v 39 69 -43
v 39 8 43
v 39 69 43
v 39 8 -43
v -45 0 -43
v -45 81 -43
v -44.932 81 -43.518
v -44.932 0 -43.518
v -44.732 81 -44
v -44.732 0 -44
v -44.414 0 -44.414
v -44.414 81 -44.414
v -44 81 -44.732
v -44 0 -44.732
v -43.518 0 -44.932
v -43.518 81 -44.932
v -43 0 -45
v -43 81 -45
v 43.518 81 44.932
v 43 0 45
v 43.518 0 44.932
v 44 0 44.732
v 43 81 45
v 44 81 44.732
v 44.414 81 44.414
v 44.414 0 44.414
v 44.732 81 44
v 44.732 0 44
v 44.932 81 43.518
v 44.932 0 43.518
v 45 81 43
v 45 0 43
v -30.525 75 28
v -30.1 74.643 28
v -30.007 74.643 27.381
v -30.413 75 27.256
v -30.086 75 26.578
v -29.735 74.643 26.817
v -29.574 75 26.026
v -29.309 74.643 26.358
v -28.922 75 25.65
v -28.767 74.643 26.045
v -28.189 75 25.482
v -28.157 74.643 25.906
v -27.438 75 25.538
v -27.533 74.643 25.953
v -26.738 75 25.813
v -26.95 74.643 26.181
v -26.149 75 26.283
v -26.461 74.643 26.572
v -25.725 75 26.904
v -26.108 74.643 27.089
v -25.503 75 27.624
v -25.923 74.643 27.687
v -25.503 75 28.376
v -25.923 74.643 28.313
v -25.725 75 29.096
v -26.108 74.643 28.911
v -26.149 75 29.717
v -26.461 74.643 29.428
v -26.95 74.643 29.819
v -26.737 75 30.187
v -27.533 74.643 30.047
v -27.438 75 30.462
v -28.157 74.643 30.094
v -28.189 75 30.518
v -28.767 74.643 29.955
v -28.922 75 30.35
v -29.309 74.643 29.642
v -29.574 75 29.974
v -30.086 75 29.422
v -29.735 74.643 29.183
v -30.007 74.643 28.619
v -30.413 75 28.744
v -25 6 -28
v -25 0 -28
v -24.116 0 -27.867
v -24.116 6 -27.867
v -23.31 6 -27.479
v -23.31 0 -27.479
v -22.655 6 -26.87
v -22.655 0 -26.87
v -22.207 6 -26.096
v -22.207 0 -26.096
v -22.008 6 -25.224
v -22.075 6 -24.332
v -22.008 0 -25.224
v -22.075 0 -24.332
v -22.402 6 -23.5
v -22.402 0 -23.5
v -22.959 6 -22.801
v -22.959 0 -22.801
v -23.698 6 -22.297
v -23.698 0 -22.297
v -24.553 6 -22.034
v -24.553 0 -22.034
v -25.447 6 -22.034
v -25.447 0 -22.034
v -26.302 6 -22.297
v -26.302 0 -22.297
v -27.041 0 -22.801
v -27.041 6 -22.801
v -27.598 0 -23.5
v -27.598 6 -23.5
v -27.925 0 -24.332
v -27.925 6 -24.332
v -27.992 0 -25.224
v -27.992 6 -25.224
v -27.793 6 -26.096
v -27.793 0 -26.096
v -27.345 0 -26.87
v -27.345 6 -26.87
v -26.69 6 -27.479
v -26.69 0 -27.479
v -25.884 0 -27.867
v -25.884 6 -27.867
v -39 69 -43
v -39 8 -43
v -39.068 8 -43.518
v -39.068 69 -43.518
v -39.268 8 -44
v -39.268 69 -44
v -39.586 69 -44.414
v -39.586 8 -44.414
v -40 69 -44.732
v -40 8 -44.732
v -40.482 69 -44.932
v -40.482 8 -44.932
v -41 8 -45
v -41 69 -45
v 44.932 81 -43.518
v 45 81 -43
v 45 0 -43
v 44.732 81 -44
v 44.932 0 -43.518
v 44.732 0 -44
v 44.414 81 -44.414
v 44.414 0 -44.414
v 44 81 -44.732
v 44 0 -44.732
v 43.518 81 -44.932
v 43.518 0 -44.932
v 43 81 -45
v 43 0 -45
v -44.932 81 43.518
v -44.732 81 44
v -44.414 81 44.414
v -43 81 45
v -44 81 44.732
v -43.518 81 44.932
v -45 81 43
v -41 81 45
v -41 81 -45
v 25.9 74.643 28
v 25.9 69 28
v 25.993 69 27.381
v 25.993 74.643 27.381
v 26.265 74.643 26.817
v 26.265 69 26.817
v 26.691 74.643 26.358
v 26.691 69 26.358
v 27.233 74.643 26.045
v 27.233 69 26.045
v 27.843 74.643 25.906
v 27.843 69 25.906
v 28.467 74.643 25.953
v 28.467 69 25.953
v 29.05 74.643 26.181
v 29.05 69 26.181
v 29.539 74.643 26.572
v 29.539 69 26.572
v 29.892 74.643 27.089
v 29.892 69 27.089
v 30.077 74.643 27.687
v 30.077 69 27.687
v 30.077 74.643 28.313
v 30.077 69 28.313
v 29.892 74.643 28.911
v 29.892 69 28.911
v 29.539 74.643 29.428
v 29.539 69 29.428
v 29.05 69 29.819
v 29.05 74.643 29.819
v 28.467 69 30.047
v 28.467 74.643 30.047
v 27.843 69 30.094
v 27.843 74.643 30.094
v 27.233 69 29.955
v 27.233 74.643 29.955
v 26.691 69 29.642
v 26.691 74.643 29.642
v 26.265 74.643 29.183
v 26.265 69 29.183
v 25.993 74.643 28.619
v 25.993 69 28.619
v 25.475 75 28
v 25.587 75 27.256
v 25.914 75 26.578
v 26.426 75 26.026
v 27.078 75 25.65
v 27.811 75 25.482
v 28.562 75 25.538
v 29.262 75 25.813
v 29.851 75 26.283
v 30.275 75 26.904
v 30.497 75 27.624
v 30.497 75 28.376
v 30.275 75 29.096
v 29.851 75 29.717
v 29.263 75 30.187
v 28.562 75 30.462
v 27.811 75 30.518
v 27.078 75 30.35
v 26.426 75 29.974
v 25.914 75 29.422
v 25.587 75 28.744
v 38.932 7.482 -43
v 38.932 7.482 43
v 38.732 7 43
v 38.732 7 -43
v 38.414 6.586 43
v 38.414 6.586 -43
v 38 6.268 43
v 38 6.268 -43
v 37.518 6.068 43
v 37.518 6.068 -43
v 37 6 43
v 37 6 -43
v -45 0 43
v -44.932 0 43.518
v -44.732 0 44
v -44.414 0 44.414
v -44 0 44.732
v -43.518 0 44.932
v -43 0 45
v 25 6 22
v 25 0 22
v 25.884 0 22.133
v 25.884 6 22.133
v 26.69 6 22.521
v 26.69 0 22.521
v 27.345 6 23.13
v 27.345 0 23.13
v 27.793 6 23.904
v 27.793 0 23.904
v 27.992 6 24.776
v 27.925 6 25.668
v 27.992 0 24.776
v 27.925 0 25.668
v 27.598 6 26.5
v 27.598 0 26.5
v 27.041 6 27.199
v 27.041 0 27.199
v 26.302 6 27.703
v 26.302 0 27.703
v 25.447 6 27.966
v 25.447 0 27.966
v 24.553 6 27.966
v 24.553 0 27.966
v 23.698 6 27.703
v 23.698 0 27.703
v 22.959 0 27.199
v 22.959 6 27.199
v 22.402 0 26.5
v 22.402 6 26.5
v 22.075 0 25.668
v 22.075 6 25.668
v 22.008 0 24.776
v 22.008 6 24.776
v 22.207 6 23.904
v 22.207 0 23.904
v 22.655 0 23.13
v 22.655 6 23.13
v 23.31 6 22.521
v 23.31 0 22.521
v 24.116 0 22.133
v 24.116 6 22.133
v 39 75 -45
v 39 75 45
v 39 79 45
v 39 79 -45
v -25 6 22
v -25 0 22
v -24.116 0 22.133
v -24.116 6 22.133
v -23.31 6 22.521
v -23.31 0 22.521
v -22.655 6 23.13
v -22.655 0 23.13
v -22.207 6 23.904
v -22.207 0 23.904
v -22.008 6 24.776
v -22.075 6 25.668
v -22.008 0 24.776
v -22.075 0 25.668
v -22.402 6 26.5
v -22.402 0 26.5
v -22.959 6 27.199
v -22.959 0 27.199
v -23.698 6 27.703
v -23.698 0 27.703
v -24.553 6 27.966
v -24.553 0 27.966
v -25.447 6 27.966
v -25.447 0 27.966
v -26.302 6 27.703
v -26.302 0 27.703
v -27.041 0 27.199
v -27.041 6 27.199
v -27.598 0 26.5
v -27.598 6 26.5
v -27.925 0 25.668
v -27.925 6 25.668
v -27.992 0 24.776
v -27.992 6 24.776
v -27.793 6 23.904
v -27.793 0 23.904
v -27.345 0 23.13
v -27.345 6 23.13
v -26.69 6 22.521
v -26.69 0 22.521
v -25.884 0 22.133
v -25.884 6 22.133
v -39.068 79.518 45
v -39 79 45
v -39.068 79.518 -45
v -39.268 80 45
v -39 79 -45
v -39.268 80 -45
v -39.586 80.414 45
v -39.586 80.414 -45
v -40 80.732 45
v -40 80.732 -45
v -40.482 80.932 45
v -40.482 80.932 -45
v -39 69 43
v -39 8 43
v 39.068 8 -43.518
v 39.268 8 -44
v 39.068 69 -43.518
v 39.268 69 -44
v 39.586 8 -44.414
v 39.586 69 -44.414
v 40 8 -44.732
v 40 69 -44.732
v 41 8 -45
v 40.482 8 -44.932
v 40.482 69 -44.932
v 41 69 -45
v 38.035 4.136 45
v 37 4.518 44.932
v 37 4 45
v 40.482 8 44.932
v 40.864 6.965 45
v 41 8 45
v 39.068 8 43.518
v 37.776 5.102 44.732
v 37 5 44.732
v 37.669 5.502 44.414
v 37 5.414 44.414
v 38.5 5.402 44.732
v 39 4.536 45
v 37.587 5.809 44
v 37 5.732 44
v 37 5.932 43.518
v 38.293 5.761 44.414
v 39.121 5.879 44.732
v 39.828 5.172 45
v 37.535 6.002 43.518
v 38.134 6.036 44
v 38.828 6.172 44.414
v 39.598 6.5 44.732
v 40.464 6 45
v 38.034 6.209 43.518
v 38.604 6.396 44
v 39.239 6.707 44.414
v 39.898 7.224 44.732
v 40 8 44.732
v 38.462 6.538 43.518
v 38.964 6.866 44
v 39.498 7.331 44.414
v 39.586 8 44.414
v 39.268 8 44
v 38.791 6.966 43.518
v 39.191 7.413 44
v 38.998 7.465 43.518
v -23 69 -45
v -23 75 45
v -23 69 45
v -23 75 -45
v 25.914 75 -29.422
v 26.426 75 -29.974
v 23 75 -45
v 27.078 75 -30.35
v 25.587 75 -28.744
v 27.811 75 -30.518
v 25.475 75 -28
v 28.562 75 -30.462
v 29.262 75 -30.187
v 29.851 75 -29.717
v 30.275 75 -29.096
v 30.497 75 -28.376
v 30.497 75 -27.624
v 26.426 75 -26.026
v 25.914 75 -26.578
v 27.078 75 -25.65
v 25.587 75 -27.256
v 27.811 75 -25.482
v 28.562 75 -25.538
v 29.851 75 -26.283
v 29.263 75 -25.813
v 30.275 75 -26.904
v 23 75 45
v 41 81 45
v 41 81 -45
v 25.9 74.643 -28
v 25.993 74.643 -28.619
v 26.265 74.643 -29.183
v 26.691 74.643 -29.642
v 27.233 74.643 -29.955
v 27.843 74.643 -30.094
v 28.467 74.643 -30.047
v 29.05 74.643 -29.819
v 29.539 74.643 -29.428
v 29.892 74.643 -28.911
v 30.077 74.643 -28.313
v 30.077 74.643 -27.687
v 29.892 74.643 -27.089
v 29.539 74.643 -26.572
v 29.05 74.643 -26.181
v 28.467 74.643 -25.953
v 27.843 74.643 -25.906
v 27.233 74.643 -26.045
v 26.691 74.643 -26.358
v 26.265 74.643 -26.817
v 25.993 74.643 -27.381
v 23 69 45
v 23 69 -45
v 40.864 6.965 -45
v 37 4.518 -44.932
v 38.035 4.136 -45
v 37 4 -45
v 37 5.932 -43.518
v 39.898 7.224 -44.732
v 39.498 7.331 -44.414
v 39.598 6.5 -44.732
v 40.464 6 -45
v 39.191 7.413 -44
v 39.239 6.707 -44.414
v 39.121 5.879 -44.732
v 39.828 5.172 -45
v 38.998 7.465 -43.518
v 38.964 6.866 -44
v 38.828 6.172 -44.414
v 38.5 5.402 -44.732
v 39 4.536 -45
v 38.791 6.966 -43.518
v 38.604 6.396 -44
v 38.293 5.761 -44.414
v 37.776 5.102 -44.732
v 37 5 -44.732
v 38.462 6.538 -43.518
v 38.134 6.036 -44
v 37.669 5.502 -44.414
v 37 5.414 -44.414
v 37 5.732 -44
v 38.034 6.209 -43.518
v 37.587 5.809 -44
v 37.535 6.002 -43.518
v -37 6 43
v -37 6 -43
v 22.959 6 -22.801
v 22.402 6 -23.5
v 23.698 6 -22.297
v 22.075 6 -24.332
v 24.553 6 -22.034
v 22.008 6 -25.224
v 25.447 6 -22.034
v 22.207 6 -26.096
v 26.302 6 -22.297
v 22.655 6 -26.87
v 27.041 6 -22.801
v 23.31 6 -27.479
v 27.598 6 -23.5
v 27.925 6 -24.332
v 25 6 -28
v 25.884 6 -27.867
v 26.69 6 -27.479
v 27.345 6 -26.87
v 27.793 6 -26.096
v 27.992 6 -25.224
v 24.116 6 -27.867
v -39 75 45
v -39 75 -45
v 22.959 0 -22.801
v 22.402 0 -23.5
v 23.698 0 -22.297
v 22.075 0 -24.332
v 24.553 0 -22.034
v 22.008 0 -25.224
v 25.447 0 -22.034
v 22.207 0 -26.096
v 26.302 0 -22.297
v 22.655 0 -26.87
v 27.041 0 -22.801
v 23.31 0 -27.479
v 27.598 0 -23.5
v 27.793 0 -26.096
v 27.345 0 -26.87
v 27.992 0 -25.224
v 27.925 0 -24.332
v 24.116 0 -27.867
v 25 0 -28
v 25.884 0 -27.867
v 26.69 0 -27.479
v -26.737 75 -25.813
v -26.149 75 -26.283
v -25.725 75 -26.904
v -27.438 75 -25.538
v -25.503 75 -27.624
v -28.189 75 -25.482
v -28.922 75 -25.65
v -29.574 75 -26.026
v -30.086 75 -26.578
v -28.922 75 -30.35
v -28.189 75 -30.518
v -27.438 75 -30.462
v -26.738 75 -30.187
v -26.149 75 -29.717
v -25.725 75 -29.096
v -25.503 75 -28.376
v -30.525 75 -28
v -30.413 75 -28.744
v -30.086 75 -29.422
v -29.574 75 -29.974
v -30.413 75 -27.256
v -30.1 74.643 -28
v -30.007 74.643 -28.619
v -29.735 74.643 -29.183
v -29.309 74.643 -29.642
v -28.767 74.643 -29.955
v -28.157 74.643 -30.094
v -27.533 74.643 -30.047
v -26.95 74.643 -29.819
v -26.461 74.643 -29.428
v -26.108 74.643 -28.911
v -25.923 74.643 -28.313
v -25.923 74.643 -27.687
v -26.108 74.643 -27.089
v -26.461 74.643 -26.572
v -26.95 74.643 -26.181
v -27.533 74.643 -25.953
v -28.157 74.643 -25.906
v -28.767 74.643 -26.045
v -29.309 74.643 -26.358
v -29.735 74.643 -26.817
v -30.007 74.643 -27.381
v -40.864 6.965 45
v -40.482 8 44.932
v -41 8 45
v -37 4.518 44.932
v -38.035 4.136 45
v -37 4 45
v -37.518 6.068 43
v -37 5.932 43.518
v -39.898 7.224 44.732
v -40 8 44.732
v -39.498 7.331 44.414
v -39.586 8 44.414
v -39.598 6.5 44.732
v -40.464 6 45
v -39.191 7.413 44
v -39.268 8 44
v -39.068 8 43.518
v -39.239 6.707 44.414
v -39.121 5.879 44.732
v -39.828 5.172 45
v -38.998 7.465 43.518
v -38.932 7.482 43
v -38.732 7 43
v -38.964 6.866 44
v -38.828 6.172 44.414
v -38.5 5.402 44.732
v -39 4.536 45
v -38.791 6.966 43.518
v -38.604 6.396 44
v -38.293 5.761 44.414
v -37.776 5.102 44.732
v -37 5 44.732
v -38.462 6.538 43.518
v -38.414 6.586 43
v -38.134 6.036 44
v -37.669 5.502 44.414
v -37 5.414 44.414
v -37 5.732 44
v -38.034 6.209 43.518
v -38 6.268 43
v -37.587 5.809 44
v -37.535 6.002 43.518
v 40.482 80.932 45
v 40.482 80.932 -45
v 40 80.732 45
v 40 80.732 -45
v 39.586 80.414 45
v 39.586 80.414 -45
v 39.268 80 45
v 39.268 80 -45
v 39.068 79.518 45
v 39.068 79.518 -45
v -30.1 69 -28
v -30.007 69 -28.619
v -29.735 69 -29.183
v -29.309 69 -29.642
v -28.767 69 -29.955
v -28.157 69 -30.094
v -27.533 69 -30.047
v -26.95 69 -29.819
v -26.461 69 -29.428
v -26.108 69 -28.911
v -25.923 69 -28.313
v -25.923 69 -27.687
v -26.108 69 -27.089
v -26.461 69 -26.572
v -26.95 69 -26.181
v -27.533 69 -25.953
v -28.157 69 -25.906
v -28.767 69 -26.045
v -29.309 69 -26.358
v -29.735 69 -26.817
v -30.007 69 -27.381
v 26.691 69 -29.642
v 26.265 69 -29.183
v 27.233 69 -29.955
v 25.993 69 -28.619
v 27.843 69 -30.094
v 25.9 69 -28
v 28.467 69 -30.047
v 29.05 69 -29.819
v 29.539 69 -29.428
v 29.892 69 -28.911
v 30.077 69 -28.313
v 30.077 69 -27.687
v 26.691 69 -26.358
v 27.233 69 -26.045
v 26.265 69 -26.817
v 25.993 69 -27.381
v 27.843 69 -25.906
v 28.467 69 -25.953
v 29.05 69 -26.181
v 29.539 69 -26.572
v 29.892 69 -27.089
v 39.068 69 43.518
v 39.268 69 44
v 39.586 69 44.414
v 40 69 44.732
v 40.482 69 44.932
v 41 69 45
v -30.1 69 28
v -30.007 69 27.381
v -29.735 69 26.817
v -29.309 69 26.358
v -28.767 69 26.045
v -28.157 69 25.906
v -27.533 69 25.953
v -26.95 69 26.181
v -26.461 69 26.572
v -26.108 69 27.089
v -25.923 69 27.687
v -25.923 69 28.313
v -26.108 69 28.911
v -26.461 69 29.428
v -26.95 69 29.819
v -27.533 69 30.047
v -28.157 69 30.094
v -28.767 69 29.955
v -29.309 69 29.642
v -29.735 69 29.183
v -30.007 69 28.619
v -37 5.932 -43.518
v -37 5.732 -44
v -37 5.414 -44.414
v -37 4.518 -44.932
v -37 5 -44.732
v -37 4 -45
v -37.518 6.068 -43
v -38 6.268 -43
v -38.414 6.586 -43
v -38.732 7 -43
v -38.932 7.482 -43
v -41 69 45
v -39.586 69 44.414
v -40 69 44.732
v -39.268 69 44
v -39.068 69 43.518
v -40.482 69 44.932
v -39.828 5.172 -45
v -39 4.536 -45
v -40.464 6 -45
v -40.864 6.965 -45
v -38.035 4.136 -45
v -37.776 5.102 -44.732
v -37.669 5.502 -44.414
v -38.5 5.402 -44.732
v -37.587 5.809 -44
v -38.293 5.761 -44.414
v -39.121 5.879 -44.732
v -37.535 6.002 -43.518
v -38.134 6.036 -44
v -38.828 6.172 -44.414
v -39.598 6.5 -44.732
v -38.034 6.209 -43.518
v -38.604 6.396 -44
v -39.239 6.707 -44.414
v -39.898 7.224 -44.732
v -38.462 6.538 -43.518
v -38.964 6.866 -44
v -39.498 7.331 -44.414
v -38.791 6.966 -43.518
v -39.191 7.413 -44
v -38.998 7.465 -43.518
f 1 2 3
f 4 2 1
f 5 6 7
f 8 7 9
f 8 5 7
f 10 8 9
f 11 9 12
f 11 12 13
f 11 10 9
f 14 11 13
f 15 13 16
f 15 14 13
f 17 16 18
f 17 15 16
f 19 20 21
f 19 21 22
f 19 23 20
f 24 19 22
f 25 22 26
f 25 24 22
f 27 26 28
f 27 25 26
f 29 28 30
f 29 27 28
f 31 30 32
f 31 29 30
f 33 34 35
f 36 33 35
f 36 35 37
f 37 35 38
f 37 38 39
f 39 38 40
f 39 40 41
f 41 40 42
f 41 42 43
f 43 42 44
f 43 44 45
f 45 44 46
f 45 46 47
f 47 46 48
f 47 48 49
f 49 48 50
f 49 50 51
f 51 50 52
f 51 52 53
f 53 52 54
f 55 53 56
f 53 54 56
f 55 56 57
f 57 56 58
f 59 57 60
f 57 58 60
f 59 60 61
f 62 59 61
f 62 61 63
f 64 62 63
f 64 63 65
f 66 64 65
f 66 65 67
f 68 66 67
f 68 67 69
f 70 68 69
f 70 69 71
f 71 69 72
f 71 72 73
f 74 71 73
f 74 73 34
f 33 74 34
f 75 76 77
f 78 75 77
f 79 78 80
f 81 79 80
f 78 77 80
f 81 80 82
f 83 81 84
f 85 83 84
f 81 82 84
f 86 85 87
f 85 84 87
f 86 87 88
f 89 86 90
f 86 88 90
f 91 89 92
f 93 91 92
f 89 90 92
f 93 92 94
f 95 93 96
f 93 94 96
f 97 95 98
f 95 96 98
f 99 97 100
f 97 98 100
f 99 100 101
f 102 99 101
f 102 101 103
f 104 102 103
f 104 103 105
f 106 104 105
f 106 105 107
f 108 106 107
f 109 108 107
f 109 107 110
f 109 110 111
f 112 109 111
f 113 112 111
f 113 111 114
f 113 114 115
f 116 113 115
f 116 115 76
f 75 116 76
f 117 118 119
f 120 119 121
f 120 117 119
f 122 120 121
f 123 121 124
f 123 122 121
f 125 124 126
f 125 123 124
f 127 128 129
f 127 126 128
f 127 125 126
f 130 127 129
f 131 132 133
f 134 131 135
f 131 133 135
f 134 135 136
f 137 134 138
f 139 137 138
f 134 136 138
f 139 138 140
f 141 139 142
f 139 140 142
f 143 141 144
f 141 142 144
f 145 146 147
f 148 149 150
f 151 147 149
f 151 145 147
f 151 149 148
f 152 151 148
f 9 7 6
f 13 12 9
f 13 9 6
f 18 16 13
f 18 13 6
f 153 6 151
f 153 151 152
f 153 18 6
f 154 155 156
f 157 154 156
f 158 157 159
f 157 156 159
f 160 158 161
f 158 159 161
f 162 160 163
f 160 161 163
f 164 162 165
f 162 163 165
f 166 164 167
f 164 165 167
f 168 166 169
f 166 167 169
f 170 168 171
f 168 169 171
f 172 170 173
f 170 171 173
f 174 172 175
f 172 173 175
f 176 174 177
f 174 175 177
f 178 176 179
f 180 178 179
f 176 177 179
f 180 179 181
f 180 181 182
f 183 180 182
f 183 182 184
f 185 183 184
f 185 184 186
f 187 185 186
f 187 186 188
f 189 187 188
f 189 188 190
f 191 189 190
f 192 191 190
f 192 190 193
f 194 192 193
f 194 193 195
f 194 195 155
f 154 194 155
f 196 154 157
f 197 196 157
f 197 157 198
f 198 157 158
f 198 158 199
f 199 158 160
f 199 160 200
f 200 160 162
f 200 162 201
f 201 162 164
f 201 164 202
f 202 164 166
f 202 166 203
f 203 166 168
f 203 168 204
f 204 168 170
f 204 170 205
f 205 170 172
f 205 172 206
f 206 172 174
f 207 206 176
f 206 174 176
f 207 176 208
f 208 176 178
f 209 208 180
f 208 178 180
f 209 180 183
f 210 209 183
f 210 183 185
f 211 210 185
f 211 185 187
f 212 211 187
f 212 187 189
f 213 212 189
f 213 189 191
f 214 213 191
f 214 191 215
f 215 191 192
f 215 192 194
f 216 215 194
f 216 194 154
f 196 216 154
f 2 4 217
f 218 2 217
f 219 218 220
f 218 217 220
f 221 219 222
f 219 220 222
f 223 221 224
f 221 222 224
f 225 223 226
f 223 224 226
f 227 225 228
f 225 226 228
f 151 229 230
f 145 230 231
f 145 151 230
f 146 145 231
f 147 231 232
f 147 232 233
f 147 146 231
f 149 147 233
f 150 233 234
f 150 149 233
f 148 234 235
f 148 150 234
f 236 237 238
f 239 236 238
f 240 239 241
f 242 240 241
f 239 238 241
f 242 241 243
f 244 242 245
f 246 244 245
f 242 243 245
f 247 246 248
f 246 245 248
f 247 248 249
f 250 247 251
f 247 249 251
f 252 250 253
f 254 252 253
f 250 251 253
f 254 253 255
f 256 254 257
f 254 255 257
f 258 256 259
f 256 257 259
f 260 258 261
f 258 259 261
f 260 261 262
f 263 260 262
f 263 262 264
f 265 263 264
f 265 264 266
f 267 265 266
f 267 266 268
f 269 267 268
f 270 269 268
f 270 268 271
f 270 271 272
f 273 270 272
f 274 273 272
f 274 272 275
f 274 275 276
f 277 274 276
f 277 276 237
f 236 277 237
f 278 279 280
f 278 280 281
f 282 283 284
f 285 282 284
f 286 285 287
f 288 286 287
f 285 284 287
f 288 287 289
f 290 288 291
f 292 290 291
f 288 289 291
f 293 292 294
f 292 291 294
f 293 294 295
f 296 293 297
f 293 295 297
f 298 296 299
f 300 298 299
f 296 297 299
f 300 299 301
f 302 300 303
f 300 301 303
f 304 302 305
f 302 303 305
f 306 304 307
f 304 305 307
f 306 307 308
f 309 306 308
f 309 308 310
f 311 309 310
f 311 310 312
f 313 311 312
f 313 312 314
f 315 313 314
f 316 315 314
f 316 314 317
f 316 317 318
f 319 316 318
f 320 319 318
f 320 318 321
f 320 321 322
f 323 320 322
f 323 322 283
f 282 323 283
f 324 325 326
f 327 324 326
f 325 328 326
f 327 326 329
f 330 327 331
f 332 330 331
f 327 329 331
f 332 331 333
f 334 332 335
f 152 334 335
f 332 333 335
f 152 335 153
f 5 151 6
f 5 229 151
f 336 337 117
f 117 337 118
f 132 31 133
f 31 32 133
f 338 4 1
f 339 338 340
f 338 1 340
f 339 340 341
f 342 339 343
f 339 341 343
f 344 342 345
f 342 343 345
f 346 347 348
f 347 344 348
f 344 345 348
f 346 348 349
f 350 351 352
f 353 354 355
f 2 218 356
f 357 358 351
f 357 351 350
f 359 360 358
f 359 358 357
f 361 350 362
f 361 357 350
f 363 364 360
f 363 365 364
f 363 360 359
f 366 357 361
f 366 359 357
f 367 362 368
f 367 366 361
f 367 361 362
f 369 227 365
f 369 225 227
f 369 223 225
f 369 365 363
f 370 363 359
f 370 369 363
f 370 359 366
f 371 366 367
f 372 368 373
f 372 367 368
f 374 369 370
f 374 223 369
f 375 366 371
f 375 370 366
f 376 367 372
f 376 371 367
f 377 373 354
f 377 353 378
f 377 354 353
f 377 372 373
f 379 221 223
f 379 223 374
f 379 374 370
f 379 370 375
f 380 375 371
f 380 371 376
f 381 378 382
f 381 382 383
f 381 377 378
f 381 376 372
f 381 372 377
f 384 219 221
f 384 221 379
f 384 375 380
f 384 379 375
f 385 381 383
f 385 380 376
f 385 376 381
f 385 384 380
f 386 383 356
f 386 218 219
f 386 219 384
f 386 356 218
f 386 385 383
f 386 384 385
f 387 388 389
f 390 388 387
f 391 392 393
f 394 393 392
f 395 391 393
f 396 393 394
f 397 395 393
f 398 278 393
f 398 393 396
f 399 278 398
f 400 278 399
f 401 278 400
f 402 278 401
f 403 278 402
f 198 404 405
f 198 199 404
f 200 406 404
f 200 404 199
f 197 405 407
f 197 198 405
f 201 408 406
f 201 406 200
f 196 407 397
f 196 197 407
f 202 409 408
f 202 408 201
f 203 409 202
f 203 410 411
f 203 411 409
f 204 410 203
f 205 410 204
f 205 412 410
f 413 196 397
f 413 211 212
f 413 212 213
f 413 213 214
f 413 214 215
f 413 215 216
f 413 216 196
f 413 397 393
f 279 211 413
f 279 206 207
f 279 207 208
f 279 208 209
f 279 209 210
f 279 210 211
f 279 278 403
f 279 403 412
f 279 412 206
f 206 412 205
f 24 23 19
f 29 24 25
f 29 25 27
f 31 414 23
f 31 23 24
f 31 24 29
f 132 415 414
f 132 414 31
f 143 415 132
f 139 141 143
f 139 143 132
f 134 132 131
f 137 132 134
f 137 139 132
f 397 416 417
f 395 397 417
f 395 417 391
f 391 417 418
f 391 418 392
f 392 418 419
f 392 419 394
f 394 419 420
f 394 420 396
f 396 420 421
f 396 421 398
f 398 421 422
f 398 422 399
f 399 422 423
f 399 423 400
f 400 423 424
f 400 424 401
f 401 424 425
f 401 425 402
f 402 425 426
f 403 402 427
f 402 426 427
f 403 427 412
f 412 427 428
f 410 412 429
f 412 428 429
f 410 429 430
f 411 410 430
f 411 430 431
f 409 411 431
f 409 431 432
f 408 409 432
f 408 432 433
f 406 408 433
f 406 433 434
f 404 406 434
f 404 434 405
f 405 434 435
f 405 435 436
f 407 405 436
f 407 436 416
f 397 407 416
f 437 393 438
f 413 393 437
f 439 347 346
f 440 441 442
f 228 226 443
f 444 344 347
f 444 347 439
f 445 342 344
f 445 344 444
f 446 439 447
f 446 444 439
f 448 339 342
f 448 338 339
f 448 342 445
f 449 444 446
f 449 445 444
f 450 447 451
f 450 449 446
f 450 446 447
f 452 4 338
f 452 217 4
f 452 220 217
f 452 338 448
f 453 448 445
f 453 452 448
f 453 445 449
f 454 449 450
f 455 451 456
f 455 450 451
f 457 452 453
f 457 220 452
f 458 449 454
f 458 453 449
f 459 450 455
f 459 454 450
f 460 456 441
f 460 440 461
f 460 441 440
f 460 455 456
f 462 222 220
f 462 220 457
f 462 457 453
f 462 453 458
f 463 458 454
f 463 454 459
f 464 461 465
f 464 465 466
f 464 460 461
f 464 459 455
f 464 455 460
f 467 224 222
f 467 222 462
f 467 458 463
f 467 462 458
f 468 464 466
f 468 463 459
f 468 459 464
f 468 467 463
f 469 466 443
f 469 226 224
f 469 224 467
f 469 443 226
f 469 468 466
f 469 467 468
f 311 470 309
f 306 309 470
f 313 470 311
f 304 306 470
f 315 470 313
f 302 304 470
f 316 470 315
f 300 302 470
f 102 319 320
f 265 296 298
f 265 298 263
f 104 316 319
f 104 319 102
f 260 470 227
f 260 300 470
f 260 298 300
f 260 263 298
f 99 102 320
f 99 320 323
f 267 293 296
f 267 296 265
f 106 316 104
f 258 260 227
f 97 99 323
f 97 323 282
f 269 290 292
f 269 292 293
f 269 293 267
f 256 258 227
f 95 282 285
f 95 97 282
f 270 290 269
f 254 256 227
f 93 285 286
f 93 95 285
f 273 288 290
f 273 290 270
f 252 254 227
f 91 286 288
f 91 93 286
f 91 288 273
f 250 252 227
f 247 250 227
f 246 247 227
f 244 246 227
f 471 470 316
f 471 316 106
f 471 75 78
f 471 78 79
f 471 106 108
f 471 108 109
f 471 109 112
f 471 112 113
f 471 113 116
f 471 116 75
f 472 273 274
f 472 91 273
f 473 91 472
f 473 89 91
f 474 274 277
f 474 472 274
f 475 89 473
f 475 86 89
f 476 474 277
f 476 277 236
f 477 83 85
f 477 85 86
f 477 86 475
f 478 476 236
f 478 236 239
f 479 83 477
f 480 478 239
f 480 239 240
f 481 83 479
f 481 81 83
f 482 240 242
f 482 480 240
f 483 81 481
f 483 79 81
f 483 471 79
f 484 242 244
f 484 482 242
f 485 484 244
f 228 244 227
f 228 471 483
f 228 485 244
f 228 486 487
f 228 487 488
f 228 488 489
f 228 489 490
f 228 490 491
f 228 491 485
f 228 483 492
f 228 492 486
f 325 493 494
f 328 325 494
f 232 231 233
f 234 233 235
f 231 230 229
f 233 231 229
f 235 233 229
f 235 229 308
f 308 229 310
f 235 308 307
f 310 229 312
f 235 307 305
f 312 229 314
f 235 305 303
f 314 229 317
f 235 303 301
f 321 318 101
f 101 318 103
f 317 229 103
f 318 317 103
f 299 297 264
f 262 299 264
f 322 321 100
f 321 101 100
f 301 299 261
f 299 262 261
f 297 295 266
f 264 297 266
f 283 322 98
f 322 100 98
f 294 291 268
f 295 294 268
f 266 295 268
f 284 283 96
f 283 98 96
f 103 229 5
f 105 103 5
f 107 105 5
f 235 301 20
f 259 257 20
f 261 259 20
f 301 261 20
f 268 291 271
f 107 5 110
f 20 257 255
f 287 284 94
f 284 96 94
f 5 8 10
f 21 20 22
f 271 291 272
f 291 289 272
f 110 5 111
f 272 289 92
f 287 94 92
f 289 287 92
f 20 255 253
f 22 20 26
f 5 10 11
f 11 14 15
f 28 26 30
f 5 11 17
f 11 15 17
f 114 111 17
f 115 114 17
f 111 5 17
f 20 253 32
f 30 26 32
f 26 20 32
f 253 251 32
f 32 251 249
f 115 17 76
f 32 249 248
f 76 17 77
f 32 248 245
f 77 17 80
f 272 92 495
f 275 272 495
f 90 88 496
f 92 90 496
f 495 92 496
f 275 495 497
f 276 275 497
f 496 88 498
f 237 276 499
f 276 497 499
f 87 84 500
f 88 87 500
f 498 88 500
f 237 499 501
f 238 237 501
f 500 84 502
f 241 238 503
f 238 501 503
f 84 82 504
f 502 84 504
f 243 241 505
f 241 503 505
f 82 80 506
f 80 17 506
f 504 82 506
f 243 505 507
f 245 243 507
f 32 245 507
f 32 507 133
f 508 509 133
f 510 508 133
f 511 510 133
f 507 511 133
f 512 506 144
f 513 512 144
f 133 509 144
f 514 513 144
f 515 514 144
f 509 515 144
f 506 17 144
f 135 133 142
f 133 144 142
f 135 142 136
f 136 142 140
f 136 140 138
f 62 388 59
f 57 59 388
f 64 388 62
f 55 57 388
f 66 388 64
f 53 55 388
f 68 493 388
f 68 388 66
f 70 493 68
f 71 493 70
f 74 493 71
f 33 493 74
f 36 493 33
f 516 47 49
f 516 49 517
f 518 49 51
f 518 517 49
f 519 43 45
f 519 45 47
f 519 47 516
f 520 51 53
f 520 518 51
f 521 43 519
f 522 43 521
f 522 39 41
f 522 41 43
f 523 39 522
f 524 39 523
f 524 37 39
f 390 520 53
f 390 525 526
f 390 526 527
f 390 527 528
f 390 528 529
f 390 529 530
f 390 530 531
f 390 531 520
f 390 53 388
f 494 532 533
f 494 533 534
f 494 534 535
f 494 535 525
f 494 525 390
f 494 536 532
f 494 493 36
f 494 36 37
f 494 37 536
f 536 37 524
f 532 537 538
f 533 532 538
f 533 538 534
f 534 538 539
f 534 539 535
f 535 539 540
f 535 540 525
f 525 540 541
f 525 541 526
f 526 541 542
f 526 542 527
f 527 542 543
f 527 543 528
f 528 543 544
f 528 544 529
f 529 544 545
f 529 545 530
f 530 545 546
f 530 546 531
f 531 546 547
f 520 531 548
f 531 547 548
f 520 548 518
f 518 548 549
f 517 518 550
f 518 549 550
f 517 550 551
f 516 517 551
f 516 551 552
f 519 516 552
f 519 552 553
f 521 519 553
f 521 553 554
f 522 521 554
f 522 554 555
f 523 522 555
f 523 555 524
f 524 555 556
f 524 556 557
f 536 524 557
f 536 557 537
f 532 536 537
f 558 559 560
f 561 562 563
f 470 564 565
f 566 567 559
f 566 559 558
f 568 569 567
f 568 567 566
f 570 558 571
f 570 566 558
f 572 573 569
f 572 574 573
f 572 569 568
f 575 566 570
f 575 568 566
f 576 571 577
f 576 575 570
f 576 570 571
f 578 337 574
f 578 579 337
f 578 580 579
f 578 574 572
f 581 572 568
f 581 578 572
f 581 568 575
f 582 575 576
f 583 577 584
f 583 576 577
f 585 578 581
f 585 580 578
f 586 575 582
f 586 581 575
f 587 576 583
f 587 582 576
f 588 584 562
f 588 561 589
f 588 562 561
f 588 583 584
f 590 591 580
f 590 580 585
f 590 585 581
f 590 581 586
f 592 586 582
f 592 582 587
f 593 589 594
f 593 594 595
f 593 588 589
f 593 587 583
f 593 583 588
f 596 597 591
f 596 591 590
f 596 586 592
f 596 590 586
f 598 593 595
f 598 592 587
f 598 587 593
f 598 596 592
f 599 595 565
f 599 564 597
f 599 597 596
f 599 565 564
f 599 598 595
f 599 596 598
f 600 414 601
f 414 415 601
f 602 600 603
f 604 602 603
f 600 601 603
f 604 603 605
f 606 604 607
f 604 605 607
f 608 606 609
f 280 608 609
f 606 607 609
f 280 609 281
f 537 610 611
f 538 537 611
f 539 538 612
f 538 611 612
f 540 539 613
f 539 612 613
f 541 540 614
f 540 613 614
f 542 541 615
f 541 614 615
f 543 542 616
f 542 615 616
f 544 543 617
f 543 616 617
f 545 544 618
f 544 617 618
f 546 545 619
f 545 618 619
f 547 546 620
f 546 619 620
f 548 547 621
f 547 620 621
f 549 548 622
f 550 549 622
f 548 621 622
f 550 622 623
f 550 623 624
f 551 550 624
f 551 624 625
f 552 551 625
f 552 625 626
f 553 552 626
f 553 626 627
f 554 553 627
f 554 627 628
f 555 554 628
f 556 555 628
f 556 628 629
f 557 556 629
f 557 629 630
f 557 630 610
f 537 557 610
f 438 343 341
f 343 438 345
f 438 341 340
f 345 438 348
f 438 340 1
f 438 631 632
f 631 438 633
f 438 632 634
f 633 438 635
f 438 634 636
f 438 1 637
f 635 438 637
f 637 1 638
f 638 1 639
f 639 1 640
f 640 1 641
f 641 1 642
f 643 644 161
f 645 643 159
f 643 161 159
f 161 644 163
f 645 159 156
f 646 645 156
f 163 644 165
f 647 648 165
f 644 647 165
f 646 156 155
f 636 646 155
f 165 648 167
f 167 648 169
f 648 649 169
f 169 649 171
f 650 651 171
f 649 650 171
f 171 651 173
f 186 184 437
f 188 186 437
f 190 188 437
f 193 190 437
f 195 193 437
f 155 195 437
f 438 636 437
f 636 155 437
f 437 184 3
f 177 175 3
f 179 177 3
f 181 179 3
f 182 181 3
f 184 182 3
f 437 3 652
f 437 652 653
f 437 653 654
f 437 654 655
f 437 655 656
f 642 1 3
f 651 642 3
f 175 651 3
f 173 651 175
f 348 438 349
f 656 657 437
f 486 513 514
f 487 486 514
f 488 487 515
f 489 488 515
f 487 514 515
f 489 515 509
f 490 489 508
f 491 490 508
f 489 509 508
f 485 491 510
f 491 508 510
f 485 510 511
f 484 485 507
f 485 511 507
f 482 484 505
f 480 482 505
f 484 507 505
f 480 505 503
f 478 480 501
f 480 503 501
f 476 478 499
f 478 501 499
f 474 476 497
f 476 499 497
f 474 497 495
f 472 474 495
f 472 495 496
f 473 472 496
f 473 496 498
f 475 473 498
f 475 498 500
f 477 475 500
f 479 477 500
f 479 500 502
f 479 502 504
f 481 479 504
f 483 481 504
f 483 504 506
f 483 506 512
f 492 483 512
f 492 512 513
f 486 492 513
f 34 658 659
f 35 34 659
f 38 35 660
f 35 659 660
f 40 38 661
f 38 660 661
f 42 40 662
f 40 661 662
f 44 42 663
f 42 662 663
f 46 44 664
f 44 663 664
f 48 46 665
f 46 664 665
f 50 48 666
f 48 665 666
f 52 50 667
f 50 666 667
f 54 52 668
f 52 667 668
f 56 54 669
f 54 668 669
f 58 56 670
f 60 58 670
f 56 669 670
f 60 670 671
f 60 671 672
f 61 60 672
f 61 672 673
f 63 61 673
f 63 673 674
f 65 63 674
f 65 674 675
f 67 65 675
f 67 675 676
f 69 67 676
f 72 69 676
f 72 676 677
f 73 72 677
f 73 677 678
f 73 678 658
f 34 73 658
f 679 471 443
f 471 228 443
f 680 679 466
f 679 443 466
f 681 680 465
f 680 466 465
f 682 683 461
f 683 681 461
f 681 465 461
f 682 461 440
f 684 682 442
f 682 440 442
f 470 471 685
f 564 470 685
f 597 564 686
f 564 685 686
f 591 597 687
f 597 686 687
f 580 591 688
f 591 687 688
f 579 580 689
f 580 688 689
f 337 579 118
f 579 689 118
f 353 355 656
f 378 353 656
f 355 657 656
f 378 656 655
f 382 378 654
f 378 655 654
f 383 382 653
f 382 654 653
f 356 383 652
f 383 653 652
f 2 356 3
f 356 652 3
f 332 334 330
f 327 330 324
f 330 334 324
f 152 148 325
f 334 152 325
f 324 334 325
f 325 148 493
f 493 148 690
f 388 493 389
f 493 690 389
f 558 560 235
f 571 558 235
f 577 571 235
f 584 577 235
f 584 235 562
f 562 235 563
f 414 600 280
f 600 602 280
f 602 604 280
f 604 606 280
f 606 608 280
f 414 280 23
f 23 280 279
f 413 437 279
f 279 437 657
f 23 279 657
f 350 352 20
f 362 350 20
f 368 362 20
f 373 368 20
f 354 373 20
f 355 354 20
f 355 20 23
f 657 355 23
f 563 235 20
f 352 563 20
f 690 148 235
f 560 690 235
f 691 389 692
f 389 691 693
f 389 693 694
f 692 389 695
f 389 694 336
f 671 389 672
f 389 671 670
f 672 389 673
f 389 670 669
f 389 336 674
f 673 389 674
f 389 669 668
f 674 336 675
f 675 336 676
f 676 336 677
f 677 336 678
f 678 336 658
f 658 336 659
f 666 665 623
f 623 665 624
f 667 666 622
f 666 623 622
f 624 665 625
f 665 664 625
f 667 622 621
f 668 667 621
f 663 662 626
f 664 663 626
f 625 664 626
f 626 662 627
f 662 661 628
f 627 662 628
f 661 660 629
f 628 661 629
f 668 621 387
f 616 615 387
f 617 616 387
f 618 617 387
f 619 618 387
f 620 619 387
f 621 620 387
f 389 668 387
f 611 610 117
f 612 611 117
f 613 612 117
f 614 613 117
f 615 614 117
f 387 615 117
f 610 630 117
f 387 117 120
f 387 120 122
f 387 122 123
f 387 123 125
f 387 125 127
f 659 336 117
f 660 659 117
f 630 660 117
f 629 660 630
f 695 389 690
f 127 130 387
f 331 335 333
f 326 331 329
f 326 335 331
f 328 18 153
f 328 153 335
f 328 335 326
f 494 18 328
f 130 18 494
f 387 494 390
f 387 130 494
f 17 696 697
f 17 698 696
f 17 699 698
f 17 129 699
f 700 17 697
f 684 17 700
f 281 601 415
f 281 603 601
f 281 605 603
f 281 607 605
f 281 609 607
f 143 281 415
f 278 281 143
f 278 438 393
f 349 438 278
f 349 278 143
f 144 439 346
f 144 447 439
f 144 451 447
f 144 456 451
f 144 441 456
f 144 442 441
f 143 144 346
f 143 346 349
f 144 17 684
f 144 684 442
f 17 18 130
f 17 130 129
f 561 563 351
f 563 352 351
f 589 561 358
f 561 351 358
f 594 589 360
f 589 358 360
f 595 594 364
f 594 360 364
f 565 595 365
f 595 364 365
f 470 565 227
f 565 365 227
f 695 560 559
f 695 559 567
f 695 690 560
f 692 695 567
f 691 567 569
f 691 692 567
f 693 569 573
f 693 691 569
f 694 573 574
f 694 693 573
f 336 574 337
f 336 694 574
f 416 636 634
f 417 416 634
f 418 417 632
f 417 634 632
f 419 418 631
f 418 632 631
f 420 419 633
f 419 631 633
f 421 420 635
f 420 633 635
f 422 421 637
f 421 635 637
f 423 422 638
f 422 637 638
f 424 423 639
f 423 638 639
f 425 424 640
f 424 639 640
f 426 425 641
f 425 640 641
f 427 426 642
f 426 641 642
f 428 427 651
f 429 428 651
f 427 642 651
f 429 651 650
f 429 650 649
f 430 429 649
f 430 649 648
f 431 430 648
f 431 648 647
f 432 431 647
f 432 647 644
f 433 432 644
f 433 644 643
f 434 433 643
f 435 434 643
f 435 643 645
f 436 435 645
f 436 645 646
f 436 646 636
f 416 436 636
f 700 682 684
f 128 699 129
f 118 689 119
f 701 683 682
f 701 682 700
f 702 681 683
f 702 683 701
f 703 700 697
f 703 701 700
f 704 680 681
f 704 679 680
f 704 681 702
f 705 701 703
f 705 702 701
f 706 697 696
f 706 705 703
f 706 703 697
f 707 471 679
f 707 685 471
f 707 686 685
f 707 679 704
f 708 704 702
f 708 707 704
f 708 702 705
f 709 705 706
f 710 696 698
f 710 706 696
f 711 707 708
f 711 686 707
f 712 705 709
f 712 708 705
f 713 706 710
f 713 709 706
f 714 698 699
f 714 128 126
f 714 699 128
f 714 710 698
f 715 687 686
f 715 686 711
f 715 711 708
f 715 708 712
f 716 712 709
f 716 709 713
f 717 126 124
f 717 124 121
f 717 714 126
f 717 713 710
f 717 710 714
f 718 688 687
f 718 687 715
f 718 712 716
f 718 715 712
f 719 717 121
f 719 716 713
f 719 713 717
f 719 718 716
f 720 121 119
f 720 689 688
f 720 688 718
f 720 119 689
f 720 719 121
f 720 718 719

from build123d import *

# Parameters (mm, degrees)
SKETCH2_W                       = 90
SKETCH2_H                       = 90
BOSS_EXTRUDE1_DEPTH             = 6
SKETCH3_W                       = 6
SKETCH3_H                       = 90
BOSS_EXTRUDE2_DEPTH             = 75
SKETCH5_W                       = 90
SKETCH5_H                       = 6
BOSS_EXTRUDE3_DEPTH             = 16
SKETCH6_W                       = 90
SKETCH6_H                       = 6
BOSS_EXTRUDE4_DEPTH             = 16
CUT_EXTRUDE1_REACH              = 105.01
SKETCH7_R                       = 3
M5X0_8_TAPPED_HOLE2_D           = 4.2
M5X0_8_TAPPED_HOLE2_DEPTH       = 6
M5X0_8_TAPPED_HOLE2_CSINK_D     = 5.05
M5X0_8_TAPPED_HOLE2_CSINK_ANGLE = 100
FILLET2_R                       = 2


with BuildPart() as part:
    # Sketch2 → Boss-Extrude1 (new body)
    with BuildSketch(Plane(origin=(0, 0, 0), x_dir=(1, 0, 0), z_dir=(0, 1, 0))):
        Rectangle(SKETCH2_W, SKETCH2_H)
    extrude(amount=BOSS_EXTRUDE1_DEPTH)

    # Sketch3 → Boss-Extrude2 (add)
    with BuildSketch(Plane(origin=(0, 6, 0), x_dir=(1, 0, 0), z_dir=(0, 1, 0))):
        with Locations((-42, 0)):
            Rectangle(SKETCH3_W, SKETCH3_H)
        with Locations((42, 0)):
            Rectangle(SKETCH3_W, SKETCH3_H)
    extrude(amount=BOSS_EXTRUDE2_DEPTH)

    # Sketch5 → Boss-Extrude3 (add)
    with BuildSketch(Plane(origin=(-39, 0, 0), x_dir=(0, 0, -1), z_dir=(1, 0, 0))):
        with Locations((0, 72)):
            Rectangle(SKETCH5_W, SKETCH5_H)
    extrude(amount=BOSS_EXTRUDE3_DEPTH)

    # Sketch6 → Boss-Extrude4 (add)
    with BuildSketch(Plane.ZY.offset(-39)):
        with Locations((0, 72)):
            Rectangle(SKETCH6_W, SKETCH6_H)
    extrude(amount=BOSS_EXTRUDE4_DEPTH)

    # Sketch7 → Cut-Extrude1 (cut, up to next)
    with BuildSketch(Plane.XZ, mode=Mode.PRIVATE) as cut_extrude1_sk1:
        with Locations(Location((-25, 25, 0), (0, 0, 270))):
            Circle(SKETCH7_R)
    cut_extrude1_tool1 = extrude(cut_extrude1_sk1.sketch, amount=-CUT_EXTRUDE1_REACH, mode=Mode.PRIVATE) & part.part
    # Sketch7 → Cut-Extrude1 (cut, up to next)
    with BuildSketch(Plane.XZ, mode=Mode.PRIVATE) as cut_extrude1_sk2:
        with Locations(Location((25, 25, 0), (0, 0, 270))):
            Circle(SKETCH7_R)
    cut_extrude1_tool2 = extrude(cut_extrude1_sk2.sketch, amount=-CUT_EXTRUDE1_REACH, mode=Mode.PRIVATE) & part.part
    # Sketch7 → Cut-Extrude1 (cut, up to next)
    with BuildSketch(Plane.XZ, mode=Mode.PRIVATE) as cut_extrude1_sk3:
        with Locations(Location((25, -25, 0), (0, 0, 270))):
            Circle(SKETCH7_R)
    cut_extrude1_tool3 = extrude(cut_extrude1_sk3.sketch, amount=-CUT_EXTRUDE1_REACH, mode=Mode.PRIVATE) & part.part
    # Sketch7 → Cut-Extrude1 (cut, up to next)
    with BuildSketch(Plane.XZ, mode=Mode.PRIVATE) as cut_extrude1_sk4:
        with Locations(Location((-25, -25, 0), (0, 0, 270))):
            Circle(SKETCH7_R)
    cut_extrude1_tool4 = extrude(cut_extrude1_sk4.sketch, amount=-CUT_EXTRUDE1_REACH, mode=Mode.PRIVATE) & part.part
    add(cut_extrude1_tool1.solids().sort_by_distance((-25, 0, 25))[0], mode=Mode.SUBTRACT)
    add(cut_extrude1_tool2.solids().sort_by_distance((25, 0, 25))[0], mode=Mode.SUBTRACT)
    add(cut_extrude1_tool3.solids().sort_by_distance((25, 0, -25))[0], mode=Mode.SUBTRACT)
    add(cut_extrude1_tool4.solids().sort_by_distance((-25, 0, -25))[0], mode=Mode.SUBTRACT)

    # M5x0.8 Tapped Hole2
    with Locations(Plane(origin=(0, 75, 0), x_dir=(1, 0, 0), z_dir=(0, 1, 0))):
        with Locations((-28, 28), (-28, -28), (28, -28), (28, 28)):
            CounterSinkHole(M5X0_8_TAPPED_HOLE2_D / 2, M5X0_8_TAPPED_HOLE2_CSINK_D / 2, depth=M5X0_8_TAPPED_HOLE2_DEPTH, counter_sink_angle=M5X0_8_TAPPED_HOLE2_CSINK_ANGLE)

    # Fillet2
    fillet2_edges = [part.edges().sort_by_distance(p)[0] for p in [
        (-45, 40.5, 45),
        (-39, 37.5, 45),
        (0, 6, 45),
        (39, 37.5, 45),
        (45, 40.5, 45),
        (45, 40.5, -45),
        (39, 37.5, -45),
        (0, 6, -45),
        (-39, 37.5, -45),
        (-45, 40.5, -45),
        (39, 81, 0),
        (39, 6, 0),
        (-39, 6, 0),
        (-39, 81, 0),
    ]]
    fillet(fillet2_edges, radius=FILLET2_R)


solid = part.part
